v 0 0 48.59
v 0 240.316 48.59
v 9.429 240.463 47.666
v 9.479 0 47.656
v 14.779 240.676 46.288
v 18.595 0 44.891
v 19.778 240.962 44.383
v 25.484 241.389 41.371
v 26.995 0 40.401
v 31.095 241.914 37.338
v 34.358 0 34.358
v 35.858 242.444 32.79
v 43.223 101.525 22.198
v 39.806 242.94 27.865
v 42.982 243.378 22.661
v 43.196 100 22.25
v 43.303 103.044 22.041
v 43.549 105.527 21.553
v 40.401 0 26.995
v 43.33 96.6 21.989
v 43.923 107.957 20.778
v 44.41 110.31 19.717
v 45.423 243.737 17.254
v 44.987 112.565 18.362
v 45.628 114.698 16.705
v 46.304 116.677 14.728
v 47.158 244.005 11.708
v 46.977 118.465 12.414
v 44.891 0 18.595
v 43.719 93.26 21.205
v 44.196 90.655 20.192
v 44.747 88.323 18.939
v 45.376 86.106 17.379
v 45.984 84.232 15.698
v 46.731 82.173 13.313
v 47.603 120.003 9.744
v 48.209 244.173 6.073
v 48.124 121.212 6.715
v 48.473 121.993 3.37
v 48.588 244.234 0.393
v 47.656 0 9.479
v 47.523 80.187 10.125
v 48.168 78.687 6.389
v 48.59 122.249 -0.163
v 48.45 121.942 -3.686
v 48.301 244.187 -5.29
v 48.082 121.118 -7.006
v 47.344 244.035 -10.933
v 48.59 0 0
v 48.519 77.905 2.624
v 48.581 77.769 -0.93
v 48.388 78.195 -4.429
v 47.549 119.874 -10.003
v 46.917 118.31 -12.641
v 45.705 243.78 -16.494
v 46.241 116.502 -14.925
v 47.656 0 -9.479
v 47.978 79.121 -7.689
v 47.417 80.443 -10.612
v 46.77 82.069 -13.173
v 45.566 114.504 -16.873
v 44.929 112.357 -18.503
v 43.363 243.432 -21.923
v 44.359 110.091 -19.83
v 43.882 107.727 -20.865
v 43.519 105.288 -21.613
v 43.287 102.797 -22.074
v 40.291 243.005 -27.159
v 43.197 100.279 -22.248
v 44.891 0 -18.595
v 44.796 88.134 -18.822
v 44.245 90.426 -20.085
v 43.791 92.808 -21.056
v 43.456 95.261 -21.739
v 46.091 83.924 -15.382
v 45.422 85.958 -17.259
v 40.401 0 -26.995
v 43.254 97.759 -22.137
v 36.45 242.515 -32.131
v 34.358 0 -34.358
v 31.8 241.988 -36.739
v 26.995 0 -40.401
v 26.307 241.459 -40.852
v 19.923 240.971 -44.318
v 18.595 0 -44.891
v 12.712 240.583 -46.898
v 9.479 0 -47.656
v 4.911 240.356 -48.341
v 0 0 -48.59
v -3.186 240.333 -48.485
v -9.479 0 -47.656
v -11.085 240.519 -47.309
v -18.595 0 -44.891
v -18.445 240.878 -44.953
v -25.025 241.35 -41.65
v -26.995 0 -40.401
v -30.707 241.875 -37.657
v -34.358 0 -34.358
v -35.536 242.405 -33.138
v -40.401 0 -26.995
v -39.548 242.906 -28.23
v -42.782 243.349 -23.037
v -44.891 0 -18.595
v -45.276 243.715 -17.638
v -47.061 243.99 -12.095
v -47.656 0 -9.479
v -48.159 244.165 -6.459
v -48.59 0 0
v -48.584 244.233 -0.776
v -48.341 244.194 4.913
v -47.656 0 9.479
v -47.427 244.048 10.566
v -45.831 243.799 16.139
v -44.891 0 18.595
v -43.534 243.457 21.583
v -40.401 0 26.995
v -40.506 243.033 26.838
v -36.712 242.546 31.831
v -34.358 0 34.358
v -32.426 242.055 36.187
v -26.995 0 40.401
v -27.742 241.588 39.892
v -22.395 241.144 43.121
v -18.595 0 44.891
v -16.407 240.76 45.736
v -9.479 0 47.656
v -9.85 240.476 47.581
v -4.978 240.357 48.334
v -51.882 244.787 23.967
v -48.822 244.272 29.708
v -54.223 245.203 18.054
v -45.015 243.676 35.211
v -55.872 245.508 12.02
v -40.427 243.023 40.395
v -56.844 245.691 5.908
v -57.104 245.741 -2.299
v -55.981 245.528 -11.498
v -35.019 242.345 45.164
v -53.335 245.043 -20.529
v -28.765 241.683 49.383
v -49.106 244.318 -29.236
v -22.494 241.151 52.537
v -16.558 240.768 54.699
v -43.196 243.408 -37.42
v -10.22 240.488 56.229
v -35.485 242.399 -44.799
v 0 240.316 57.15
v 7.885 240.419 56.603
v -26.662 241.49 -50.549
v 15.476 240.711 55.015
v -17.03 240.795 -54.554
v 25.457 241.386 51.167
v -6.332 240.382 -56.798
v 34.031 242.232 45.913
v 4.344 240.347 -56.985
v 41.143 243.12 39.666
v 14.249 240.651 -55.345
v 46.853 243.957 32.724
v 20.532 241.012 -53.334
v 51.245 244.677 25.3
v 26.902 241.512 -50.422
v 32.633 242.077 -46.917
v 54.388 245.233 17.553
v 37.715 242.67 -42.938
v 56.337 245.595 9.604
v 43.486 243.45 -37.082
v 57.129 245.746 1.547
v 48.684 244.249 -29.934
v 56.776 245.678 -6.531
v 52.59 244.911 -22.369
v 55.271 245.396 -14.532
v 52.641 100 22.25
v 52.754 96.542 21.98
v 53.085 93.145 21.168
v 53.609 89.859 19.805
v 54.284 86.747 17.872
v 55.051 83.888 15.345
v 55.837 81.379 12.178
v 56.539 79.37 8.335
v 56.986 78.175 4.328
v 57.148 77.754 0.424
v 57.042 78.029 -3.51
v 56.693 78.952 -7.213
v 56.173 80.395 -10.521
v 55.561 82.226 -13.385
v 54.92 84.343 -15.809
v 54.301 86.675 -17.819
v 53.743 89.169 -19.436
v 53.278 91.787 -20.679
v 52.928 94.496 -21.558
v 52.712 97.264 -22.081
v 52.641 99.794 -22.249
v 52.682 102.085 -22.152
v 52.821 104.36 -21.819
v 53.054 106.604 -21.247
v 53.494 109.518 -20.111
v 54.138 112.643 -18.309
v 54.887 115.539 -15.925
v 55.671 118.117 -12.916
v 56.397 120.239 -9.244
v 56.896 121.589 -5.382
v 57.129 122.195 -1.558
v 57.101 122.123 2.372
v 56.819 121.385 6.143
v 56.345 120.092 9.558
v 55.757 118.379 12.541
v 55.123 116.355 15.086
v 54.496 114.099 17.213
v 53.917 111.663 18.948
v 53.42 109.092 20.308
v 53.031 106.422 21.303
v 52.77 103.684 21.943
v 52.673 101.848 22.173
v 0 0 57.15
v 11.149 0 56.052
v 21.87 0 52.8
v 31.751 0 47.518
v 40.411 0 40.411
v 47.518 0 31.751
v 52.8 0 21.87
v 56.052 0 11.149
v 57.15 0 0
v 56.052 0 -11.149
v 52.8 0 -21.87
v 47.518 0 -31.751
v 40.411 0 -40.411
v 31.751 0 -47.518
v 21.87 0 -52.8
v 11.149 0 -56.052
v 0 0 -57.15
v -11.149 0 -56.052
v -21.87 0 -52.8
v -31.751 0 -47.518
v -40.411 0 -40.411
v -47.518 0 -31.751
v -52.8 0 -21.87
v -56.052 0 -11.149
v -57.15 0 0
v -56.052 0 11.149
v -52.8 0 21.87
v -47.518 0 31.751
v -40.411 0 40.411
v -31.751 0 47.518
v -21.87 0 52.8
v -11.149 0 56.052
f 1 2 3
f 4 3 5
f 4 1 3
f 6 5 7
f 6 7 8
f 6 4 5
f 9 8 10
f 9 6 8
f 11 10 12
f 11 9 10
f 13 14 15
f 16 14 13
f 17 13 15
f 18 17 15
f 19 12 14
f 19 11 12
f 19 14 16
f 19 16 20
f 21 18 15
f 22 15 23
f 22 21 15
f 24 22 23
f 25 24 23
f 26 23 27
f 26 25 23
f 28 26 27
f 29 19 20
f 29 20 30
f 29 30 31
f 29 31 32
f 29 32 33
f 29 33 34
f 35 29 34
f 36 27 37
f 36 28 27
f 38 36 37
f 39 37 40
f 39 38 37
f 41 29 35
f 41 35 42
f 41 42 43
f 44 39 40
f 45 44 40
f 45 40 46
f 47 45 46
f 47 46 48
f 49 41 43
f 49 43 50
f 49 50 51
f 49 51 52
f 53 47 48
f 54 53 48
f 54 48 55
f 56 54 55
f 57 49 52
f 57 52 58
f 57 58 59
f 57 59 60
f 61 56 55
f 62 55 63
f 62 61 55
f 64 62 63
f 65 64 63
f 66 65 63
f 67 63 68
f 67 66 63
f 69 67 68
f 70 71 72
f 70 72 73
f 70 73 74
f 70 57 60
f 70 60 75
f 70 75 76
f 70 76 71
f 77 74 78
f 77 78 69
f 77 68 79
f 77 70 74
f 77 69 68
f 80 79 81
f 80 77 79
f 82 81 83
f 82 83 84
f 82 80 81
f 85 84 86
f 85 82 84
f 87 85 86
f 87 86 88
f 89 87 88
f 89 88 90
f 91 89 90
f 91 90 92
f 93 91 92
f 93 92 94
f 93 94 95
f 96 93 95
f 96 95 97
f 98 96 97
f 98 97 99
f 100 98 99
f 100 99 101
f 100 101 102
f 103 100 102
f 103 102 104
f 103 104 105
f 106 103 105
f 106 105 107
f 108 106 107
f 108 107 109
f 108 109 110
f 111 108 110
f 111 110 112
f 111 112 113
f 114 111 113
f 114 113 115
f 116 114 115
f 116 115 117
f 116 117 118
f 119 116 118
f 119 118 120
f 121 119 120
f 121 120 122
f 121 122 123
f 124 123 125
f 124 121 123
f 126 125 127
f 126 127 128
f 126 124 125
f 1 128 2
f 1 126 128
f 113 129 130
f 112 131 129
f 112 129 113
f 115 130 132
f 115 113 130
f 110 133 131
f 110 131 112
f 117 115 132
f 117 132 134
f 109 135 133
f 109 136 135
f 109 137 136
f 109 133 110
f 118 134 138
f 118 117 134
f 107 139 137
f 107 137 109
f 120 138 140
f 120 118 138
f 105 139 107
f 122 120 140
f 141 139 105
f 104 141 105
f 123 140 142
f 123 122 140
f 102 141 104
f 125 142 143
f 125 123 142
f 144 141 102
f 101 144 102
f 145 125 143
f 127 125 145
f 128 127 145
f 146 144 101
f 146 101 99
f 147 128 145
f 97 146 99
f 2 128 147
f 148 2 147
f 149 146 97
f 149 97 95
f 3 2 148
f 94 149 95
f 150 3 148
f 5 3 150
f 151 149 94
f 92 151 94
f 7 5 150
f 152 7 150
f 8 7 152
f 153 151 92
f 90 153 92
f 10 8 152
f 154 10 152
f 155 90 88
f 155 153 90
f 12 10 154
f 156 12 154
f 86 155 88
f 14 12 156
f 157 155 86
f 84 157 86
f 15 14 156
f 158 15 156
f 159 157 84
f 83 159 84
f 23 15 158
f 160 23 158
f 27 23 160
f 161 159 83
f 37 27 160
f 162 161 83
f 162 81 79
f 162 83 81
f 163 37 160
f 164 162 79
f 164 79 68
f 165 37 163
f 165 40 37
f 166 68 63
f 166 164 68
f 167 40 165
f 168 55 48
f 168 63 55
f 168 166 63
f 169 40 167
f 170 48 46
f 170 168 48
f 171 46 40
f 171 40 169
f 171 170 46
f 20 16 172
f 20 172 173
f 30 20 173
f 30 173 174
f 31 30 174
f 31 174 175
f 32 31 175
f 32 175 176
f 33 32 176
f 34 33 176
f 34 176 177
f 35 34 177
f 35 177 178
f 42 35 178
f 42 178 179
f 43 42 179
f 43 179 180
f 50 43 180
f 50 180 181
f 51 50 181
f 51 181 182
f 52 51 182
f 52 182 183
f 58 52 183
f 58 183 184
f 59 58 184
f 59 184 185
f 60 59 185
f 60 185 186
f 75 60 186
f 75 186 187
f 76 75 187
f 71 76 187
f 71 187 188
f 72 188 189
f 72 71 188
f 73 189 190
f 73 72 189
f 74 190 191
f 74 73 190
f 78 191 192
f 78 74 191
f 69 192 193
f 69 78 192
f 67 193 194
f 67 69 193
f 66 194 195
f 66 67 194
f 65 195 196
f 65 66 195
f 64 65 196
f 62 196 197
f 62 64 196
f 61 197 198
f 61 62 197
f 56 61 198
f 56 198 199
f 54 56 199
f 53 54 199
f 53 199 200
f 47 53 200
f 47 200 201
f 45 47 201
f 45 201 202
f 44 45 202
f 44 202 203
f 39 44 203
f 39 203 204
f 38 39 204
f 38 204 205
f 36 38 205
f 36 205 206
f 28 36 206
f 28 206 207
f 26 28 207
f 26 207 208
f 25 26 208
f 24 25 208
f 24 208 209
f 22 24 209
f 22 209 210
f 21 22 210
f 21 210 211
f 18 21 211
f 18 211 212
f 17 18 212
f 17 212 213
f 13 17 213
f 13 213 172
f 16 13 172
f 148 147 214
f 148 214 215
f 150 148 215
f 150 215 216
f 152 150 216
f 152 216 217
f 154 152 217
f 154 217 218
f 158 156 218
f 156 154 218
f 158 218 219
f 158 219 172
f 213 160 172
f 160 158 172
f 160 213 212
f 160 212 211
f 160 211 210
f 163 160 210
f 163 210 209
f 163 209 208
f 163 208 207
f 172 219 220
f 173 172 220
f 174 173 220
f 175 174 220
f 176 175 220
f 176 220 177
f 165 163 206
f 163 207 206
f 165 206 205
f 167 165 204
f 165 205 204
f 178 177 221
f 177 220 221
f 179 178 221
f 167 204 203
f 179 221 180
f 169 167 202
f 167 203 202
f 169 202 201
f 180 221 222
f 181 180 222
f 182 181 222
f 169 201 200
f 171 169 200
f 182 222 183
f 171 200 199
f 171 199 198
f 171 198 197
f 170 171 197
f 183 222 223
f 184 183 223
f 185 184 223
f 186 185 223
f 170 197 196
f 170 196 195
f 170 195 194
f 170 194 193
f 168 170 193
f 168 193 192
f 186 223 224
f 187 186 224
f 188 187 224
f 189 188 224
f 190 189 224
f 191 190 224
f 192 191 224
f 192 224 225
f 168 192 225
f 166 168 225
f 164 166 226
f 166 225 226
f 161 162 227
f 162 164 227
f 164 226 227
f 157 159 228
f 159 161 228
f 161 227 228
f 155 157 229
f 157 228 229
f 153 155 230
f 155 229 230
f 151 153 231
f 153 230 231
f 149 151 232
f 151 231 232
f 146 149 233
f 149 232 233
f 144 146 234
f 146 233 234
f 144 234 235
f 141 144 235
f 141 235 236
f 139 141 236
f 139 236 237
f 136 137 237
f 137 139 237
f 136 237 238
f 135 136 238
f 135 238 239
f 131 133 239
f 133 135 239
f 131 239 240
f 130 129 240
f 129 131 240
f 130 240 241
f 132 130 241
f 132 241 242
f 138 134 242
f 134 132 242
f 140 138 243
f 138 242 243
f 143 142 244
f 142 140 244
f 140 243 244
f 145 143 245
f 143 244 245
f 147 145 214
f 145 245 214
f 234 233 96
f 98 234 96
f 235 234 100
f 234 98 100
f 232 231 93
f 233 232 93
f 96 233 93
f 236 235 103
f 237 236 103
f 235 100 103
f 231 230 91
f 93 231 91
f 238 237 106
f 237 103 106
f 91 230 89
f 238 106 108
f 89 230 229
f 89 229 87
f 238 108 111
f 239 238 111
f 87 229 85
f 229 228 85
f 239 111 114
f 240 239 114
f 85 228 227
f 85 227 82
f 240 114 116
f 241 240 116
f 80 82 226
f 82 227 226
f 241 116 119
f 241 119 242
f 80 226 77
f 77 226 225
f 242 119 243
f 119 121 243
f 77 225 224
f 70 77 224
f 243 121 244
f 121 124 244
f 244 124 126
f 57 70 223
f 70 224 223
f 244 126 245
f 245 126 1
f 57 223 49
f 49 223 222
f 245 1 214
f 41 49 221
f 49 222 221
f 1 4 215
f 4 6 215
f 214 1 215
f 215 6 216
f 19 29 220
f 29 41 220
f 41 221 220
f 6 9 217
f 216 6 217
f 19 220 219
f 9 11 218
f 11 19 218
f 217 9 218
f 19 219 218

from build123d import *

# Parameters (mm, degrees)
SKETCH1_R               = 57.15
SKETCH1_R_2             = 48.59
BOSS_EXTRUDE1_DEPTH     = 245.75
CUT_EXTRUDE1_DEPTH      = 259.699260726
CUT_EXTRUDE1_DEPTH_BACK = 259.699260726
SKETCH3_R               = 22.25
CUT_EXTRUDE2_DEPTH      = 111


with BuildPart() as part:
    # Sketch1 → Boss-Extrude1 (new body)
    with BuildSketch(Plane(origin=(0, 0, 0), x_dir=(1, 0, 0), z_dir=(0, 1, 0))):
        with Locations(Location((0, 0, 0), (0, 0, 270))):
            Circle(SKETCH1_R)
        with Locations(Location((0, 0, 0), (0, 0, 270))):
            Circle(SKETCH1_R_2, mode=Mode.SUBTRACT)
    extrude(amount=BOSS_EXTRUDE1_DEPTH)

    # Sketch2 → Cut-Extrude1 (cut, two sides: drawn at the far end of the back side and taken through both)
    with BuildSketch(Plane.XY.offset(-CUT_EXTRUDE1_DEPTH_BACK)):
        with BuildLine():
            Line((57.15, 245.75), (-57.15, 245.75))
            ThreePointArc((-57.15, 245.75), (0, 240.316034778), (57.15, 245.75))
        make_face()
    extrude(amount=CUT_EXTRUDE1_DEPTH + CUT_EXTRUDE1_DEPTH_BACK, mode=Mode.SUBTRACT)

    # Sketch3 → Cut-Extrude2 (cut)
    with BuildSketch(Plane(origin=(0, 0, 0), x_dir=(0, 0, -1), z_dir=(1, 0, 0))):
        with Locations(Location((0, 100, 0), (0, 0, 180))):
            Circle(SKETCH3_R)
    extrude(amount=CUT_EXTRUDE2_DEPTH, mode=Mode.SUBTRACT)


solid = part.part
